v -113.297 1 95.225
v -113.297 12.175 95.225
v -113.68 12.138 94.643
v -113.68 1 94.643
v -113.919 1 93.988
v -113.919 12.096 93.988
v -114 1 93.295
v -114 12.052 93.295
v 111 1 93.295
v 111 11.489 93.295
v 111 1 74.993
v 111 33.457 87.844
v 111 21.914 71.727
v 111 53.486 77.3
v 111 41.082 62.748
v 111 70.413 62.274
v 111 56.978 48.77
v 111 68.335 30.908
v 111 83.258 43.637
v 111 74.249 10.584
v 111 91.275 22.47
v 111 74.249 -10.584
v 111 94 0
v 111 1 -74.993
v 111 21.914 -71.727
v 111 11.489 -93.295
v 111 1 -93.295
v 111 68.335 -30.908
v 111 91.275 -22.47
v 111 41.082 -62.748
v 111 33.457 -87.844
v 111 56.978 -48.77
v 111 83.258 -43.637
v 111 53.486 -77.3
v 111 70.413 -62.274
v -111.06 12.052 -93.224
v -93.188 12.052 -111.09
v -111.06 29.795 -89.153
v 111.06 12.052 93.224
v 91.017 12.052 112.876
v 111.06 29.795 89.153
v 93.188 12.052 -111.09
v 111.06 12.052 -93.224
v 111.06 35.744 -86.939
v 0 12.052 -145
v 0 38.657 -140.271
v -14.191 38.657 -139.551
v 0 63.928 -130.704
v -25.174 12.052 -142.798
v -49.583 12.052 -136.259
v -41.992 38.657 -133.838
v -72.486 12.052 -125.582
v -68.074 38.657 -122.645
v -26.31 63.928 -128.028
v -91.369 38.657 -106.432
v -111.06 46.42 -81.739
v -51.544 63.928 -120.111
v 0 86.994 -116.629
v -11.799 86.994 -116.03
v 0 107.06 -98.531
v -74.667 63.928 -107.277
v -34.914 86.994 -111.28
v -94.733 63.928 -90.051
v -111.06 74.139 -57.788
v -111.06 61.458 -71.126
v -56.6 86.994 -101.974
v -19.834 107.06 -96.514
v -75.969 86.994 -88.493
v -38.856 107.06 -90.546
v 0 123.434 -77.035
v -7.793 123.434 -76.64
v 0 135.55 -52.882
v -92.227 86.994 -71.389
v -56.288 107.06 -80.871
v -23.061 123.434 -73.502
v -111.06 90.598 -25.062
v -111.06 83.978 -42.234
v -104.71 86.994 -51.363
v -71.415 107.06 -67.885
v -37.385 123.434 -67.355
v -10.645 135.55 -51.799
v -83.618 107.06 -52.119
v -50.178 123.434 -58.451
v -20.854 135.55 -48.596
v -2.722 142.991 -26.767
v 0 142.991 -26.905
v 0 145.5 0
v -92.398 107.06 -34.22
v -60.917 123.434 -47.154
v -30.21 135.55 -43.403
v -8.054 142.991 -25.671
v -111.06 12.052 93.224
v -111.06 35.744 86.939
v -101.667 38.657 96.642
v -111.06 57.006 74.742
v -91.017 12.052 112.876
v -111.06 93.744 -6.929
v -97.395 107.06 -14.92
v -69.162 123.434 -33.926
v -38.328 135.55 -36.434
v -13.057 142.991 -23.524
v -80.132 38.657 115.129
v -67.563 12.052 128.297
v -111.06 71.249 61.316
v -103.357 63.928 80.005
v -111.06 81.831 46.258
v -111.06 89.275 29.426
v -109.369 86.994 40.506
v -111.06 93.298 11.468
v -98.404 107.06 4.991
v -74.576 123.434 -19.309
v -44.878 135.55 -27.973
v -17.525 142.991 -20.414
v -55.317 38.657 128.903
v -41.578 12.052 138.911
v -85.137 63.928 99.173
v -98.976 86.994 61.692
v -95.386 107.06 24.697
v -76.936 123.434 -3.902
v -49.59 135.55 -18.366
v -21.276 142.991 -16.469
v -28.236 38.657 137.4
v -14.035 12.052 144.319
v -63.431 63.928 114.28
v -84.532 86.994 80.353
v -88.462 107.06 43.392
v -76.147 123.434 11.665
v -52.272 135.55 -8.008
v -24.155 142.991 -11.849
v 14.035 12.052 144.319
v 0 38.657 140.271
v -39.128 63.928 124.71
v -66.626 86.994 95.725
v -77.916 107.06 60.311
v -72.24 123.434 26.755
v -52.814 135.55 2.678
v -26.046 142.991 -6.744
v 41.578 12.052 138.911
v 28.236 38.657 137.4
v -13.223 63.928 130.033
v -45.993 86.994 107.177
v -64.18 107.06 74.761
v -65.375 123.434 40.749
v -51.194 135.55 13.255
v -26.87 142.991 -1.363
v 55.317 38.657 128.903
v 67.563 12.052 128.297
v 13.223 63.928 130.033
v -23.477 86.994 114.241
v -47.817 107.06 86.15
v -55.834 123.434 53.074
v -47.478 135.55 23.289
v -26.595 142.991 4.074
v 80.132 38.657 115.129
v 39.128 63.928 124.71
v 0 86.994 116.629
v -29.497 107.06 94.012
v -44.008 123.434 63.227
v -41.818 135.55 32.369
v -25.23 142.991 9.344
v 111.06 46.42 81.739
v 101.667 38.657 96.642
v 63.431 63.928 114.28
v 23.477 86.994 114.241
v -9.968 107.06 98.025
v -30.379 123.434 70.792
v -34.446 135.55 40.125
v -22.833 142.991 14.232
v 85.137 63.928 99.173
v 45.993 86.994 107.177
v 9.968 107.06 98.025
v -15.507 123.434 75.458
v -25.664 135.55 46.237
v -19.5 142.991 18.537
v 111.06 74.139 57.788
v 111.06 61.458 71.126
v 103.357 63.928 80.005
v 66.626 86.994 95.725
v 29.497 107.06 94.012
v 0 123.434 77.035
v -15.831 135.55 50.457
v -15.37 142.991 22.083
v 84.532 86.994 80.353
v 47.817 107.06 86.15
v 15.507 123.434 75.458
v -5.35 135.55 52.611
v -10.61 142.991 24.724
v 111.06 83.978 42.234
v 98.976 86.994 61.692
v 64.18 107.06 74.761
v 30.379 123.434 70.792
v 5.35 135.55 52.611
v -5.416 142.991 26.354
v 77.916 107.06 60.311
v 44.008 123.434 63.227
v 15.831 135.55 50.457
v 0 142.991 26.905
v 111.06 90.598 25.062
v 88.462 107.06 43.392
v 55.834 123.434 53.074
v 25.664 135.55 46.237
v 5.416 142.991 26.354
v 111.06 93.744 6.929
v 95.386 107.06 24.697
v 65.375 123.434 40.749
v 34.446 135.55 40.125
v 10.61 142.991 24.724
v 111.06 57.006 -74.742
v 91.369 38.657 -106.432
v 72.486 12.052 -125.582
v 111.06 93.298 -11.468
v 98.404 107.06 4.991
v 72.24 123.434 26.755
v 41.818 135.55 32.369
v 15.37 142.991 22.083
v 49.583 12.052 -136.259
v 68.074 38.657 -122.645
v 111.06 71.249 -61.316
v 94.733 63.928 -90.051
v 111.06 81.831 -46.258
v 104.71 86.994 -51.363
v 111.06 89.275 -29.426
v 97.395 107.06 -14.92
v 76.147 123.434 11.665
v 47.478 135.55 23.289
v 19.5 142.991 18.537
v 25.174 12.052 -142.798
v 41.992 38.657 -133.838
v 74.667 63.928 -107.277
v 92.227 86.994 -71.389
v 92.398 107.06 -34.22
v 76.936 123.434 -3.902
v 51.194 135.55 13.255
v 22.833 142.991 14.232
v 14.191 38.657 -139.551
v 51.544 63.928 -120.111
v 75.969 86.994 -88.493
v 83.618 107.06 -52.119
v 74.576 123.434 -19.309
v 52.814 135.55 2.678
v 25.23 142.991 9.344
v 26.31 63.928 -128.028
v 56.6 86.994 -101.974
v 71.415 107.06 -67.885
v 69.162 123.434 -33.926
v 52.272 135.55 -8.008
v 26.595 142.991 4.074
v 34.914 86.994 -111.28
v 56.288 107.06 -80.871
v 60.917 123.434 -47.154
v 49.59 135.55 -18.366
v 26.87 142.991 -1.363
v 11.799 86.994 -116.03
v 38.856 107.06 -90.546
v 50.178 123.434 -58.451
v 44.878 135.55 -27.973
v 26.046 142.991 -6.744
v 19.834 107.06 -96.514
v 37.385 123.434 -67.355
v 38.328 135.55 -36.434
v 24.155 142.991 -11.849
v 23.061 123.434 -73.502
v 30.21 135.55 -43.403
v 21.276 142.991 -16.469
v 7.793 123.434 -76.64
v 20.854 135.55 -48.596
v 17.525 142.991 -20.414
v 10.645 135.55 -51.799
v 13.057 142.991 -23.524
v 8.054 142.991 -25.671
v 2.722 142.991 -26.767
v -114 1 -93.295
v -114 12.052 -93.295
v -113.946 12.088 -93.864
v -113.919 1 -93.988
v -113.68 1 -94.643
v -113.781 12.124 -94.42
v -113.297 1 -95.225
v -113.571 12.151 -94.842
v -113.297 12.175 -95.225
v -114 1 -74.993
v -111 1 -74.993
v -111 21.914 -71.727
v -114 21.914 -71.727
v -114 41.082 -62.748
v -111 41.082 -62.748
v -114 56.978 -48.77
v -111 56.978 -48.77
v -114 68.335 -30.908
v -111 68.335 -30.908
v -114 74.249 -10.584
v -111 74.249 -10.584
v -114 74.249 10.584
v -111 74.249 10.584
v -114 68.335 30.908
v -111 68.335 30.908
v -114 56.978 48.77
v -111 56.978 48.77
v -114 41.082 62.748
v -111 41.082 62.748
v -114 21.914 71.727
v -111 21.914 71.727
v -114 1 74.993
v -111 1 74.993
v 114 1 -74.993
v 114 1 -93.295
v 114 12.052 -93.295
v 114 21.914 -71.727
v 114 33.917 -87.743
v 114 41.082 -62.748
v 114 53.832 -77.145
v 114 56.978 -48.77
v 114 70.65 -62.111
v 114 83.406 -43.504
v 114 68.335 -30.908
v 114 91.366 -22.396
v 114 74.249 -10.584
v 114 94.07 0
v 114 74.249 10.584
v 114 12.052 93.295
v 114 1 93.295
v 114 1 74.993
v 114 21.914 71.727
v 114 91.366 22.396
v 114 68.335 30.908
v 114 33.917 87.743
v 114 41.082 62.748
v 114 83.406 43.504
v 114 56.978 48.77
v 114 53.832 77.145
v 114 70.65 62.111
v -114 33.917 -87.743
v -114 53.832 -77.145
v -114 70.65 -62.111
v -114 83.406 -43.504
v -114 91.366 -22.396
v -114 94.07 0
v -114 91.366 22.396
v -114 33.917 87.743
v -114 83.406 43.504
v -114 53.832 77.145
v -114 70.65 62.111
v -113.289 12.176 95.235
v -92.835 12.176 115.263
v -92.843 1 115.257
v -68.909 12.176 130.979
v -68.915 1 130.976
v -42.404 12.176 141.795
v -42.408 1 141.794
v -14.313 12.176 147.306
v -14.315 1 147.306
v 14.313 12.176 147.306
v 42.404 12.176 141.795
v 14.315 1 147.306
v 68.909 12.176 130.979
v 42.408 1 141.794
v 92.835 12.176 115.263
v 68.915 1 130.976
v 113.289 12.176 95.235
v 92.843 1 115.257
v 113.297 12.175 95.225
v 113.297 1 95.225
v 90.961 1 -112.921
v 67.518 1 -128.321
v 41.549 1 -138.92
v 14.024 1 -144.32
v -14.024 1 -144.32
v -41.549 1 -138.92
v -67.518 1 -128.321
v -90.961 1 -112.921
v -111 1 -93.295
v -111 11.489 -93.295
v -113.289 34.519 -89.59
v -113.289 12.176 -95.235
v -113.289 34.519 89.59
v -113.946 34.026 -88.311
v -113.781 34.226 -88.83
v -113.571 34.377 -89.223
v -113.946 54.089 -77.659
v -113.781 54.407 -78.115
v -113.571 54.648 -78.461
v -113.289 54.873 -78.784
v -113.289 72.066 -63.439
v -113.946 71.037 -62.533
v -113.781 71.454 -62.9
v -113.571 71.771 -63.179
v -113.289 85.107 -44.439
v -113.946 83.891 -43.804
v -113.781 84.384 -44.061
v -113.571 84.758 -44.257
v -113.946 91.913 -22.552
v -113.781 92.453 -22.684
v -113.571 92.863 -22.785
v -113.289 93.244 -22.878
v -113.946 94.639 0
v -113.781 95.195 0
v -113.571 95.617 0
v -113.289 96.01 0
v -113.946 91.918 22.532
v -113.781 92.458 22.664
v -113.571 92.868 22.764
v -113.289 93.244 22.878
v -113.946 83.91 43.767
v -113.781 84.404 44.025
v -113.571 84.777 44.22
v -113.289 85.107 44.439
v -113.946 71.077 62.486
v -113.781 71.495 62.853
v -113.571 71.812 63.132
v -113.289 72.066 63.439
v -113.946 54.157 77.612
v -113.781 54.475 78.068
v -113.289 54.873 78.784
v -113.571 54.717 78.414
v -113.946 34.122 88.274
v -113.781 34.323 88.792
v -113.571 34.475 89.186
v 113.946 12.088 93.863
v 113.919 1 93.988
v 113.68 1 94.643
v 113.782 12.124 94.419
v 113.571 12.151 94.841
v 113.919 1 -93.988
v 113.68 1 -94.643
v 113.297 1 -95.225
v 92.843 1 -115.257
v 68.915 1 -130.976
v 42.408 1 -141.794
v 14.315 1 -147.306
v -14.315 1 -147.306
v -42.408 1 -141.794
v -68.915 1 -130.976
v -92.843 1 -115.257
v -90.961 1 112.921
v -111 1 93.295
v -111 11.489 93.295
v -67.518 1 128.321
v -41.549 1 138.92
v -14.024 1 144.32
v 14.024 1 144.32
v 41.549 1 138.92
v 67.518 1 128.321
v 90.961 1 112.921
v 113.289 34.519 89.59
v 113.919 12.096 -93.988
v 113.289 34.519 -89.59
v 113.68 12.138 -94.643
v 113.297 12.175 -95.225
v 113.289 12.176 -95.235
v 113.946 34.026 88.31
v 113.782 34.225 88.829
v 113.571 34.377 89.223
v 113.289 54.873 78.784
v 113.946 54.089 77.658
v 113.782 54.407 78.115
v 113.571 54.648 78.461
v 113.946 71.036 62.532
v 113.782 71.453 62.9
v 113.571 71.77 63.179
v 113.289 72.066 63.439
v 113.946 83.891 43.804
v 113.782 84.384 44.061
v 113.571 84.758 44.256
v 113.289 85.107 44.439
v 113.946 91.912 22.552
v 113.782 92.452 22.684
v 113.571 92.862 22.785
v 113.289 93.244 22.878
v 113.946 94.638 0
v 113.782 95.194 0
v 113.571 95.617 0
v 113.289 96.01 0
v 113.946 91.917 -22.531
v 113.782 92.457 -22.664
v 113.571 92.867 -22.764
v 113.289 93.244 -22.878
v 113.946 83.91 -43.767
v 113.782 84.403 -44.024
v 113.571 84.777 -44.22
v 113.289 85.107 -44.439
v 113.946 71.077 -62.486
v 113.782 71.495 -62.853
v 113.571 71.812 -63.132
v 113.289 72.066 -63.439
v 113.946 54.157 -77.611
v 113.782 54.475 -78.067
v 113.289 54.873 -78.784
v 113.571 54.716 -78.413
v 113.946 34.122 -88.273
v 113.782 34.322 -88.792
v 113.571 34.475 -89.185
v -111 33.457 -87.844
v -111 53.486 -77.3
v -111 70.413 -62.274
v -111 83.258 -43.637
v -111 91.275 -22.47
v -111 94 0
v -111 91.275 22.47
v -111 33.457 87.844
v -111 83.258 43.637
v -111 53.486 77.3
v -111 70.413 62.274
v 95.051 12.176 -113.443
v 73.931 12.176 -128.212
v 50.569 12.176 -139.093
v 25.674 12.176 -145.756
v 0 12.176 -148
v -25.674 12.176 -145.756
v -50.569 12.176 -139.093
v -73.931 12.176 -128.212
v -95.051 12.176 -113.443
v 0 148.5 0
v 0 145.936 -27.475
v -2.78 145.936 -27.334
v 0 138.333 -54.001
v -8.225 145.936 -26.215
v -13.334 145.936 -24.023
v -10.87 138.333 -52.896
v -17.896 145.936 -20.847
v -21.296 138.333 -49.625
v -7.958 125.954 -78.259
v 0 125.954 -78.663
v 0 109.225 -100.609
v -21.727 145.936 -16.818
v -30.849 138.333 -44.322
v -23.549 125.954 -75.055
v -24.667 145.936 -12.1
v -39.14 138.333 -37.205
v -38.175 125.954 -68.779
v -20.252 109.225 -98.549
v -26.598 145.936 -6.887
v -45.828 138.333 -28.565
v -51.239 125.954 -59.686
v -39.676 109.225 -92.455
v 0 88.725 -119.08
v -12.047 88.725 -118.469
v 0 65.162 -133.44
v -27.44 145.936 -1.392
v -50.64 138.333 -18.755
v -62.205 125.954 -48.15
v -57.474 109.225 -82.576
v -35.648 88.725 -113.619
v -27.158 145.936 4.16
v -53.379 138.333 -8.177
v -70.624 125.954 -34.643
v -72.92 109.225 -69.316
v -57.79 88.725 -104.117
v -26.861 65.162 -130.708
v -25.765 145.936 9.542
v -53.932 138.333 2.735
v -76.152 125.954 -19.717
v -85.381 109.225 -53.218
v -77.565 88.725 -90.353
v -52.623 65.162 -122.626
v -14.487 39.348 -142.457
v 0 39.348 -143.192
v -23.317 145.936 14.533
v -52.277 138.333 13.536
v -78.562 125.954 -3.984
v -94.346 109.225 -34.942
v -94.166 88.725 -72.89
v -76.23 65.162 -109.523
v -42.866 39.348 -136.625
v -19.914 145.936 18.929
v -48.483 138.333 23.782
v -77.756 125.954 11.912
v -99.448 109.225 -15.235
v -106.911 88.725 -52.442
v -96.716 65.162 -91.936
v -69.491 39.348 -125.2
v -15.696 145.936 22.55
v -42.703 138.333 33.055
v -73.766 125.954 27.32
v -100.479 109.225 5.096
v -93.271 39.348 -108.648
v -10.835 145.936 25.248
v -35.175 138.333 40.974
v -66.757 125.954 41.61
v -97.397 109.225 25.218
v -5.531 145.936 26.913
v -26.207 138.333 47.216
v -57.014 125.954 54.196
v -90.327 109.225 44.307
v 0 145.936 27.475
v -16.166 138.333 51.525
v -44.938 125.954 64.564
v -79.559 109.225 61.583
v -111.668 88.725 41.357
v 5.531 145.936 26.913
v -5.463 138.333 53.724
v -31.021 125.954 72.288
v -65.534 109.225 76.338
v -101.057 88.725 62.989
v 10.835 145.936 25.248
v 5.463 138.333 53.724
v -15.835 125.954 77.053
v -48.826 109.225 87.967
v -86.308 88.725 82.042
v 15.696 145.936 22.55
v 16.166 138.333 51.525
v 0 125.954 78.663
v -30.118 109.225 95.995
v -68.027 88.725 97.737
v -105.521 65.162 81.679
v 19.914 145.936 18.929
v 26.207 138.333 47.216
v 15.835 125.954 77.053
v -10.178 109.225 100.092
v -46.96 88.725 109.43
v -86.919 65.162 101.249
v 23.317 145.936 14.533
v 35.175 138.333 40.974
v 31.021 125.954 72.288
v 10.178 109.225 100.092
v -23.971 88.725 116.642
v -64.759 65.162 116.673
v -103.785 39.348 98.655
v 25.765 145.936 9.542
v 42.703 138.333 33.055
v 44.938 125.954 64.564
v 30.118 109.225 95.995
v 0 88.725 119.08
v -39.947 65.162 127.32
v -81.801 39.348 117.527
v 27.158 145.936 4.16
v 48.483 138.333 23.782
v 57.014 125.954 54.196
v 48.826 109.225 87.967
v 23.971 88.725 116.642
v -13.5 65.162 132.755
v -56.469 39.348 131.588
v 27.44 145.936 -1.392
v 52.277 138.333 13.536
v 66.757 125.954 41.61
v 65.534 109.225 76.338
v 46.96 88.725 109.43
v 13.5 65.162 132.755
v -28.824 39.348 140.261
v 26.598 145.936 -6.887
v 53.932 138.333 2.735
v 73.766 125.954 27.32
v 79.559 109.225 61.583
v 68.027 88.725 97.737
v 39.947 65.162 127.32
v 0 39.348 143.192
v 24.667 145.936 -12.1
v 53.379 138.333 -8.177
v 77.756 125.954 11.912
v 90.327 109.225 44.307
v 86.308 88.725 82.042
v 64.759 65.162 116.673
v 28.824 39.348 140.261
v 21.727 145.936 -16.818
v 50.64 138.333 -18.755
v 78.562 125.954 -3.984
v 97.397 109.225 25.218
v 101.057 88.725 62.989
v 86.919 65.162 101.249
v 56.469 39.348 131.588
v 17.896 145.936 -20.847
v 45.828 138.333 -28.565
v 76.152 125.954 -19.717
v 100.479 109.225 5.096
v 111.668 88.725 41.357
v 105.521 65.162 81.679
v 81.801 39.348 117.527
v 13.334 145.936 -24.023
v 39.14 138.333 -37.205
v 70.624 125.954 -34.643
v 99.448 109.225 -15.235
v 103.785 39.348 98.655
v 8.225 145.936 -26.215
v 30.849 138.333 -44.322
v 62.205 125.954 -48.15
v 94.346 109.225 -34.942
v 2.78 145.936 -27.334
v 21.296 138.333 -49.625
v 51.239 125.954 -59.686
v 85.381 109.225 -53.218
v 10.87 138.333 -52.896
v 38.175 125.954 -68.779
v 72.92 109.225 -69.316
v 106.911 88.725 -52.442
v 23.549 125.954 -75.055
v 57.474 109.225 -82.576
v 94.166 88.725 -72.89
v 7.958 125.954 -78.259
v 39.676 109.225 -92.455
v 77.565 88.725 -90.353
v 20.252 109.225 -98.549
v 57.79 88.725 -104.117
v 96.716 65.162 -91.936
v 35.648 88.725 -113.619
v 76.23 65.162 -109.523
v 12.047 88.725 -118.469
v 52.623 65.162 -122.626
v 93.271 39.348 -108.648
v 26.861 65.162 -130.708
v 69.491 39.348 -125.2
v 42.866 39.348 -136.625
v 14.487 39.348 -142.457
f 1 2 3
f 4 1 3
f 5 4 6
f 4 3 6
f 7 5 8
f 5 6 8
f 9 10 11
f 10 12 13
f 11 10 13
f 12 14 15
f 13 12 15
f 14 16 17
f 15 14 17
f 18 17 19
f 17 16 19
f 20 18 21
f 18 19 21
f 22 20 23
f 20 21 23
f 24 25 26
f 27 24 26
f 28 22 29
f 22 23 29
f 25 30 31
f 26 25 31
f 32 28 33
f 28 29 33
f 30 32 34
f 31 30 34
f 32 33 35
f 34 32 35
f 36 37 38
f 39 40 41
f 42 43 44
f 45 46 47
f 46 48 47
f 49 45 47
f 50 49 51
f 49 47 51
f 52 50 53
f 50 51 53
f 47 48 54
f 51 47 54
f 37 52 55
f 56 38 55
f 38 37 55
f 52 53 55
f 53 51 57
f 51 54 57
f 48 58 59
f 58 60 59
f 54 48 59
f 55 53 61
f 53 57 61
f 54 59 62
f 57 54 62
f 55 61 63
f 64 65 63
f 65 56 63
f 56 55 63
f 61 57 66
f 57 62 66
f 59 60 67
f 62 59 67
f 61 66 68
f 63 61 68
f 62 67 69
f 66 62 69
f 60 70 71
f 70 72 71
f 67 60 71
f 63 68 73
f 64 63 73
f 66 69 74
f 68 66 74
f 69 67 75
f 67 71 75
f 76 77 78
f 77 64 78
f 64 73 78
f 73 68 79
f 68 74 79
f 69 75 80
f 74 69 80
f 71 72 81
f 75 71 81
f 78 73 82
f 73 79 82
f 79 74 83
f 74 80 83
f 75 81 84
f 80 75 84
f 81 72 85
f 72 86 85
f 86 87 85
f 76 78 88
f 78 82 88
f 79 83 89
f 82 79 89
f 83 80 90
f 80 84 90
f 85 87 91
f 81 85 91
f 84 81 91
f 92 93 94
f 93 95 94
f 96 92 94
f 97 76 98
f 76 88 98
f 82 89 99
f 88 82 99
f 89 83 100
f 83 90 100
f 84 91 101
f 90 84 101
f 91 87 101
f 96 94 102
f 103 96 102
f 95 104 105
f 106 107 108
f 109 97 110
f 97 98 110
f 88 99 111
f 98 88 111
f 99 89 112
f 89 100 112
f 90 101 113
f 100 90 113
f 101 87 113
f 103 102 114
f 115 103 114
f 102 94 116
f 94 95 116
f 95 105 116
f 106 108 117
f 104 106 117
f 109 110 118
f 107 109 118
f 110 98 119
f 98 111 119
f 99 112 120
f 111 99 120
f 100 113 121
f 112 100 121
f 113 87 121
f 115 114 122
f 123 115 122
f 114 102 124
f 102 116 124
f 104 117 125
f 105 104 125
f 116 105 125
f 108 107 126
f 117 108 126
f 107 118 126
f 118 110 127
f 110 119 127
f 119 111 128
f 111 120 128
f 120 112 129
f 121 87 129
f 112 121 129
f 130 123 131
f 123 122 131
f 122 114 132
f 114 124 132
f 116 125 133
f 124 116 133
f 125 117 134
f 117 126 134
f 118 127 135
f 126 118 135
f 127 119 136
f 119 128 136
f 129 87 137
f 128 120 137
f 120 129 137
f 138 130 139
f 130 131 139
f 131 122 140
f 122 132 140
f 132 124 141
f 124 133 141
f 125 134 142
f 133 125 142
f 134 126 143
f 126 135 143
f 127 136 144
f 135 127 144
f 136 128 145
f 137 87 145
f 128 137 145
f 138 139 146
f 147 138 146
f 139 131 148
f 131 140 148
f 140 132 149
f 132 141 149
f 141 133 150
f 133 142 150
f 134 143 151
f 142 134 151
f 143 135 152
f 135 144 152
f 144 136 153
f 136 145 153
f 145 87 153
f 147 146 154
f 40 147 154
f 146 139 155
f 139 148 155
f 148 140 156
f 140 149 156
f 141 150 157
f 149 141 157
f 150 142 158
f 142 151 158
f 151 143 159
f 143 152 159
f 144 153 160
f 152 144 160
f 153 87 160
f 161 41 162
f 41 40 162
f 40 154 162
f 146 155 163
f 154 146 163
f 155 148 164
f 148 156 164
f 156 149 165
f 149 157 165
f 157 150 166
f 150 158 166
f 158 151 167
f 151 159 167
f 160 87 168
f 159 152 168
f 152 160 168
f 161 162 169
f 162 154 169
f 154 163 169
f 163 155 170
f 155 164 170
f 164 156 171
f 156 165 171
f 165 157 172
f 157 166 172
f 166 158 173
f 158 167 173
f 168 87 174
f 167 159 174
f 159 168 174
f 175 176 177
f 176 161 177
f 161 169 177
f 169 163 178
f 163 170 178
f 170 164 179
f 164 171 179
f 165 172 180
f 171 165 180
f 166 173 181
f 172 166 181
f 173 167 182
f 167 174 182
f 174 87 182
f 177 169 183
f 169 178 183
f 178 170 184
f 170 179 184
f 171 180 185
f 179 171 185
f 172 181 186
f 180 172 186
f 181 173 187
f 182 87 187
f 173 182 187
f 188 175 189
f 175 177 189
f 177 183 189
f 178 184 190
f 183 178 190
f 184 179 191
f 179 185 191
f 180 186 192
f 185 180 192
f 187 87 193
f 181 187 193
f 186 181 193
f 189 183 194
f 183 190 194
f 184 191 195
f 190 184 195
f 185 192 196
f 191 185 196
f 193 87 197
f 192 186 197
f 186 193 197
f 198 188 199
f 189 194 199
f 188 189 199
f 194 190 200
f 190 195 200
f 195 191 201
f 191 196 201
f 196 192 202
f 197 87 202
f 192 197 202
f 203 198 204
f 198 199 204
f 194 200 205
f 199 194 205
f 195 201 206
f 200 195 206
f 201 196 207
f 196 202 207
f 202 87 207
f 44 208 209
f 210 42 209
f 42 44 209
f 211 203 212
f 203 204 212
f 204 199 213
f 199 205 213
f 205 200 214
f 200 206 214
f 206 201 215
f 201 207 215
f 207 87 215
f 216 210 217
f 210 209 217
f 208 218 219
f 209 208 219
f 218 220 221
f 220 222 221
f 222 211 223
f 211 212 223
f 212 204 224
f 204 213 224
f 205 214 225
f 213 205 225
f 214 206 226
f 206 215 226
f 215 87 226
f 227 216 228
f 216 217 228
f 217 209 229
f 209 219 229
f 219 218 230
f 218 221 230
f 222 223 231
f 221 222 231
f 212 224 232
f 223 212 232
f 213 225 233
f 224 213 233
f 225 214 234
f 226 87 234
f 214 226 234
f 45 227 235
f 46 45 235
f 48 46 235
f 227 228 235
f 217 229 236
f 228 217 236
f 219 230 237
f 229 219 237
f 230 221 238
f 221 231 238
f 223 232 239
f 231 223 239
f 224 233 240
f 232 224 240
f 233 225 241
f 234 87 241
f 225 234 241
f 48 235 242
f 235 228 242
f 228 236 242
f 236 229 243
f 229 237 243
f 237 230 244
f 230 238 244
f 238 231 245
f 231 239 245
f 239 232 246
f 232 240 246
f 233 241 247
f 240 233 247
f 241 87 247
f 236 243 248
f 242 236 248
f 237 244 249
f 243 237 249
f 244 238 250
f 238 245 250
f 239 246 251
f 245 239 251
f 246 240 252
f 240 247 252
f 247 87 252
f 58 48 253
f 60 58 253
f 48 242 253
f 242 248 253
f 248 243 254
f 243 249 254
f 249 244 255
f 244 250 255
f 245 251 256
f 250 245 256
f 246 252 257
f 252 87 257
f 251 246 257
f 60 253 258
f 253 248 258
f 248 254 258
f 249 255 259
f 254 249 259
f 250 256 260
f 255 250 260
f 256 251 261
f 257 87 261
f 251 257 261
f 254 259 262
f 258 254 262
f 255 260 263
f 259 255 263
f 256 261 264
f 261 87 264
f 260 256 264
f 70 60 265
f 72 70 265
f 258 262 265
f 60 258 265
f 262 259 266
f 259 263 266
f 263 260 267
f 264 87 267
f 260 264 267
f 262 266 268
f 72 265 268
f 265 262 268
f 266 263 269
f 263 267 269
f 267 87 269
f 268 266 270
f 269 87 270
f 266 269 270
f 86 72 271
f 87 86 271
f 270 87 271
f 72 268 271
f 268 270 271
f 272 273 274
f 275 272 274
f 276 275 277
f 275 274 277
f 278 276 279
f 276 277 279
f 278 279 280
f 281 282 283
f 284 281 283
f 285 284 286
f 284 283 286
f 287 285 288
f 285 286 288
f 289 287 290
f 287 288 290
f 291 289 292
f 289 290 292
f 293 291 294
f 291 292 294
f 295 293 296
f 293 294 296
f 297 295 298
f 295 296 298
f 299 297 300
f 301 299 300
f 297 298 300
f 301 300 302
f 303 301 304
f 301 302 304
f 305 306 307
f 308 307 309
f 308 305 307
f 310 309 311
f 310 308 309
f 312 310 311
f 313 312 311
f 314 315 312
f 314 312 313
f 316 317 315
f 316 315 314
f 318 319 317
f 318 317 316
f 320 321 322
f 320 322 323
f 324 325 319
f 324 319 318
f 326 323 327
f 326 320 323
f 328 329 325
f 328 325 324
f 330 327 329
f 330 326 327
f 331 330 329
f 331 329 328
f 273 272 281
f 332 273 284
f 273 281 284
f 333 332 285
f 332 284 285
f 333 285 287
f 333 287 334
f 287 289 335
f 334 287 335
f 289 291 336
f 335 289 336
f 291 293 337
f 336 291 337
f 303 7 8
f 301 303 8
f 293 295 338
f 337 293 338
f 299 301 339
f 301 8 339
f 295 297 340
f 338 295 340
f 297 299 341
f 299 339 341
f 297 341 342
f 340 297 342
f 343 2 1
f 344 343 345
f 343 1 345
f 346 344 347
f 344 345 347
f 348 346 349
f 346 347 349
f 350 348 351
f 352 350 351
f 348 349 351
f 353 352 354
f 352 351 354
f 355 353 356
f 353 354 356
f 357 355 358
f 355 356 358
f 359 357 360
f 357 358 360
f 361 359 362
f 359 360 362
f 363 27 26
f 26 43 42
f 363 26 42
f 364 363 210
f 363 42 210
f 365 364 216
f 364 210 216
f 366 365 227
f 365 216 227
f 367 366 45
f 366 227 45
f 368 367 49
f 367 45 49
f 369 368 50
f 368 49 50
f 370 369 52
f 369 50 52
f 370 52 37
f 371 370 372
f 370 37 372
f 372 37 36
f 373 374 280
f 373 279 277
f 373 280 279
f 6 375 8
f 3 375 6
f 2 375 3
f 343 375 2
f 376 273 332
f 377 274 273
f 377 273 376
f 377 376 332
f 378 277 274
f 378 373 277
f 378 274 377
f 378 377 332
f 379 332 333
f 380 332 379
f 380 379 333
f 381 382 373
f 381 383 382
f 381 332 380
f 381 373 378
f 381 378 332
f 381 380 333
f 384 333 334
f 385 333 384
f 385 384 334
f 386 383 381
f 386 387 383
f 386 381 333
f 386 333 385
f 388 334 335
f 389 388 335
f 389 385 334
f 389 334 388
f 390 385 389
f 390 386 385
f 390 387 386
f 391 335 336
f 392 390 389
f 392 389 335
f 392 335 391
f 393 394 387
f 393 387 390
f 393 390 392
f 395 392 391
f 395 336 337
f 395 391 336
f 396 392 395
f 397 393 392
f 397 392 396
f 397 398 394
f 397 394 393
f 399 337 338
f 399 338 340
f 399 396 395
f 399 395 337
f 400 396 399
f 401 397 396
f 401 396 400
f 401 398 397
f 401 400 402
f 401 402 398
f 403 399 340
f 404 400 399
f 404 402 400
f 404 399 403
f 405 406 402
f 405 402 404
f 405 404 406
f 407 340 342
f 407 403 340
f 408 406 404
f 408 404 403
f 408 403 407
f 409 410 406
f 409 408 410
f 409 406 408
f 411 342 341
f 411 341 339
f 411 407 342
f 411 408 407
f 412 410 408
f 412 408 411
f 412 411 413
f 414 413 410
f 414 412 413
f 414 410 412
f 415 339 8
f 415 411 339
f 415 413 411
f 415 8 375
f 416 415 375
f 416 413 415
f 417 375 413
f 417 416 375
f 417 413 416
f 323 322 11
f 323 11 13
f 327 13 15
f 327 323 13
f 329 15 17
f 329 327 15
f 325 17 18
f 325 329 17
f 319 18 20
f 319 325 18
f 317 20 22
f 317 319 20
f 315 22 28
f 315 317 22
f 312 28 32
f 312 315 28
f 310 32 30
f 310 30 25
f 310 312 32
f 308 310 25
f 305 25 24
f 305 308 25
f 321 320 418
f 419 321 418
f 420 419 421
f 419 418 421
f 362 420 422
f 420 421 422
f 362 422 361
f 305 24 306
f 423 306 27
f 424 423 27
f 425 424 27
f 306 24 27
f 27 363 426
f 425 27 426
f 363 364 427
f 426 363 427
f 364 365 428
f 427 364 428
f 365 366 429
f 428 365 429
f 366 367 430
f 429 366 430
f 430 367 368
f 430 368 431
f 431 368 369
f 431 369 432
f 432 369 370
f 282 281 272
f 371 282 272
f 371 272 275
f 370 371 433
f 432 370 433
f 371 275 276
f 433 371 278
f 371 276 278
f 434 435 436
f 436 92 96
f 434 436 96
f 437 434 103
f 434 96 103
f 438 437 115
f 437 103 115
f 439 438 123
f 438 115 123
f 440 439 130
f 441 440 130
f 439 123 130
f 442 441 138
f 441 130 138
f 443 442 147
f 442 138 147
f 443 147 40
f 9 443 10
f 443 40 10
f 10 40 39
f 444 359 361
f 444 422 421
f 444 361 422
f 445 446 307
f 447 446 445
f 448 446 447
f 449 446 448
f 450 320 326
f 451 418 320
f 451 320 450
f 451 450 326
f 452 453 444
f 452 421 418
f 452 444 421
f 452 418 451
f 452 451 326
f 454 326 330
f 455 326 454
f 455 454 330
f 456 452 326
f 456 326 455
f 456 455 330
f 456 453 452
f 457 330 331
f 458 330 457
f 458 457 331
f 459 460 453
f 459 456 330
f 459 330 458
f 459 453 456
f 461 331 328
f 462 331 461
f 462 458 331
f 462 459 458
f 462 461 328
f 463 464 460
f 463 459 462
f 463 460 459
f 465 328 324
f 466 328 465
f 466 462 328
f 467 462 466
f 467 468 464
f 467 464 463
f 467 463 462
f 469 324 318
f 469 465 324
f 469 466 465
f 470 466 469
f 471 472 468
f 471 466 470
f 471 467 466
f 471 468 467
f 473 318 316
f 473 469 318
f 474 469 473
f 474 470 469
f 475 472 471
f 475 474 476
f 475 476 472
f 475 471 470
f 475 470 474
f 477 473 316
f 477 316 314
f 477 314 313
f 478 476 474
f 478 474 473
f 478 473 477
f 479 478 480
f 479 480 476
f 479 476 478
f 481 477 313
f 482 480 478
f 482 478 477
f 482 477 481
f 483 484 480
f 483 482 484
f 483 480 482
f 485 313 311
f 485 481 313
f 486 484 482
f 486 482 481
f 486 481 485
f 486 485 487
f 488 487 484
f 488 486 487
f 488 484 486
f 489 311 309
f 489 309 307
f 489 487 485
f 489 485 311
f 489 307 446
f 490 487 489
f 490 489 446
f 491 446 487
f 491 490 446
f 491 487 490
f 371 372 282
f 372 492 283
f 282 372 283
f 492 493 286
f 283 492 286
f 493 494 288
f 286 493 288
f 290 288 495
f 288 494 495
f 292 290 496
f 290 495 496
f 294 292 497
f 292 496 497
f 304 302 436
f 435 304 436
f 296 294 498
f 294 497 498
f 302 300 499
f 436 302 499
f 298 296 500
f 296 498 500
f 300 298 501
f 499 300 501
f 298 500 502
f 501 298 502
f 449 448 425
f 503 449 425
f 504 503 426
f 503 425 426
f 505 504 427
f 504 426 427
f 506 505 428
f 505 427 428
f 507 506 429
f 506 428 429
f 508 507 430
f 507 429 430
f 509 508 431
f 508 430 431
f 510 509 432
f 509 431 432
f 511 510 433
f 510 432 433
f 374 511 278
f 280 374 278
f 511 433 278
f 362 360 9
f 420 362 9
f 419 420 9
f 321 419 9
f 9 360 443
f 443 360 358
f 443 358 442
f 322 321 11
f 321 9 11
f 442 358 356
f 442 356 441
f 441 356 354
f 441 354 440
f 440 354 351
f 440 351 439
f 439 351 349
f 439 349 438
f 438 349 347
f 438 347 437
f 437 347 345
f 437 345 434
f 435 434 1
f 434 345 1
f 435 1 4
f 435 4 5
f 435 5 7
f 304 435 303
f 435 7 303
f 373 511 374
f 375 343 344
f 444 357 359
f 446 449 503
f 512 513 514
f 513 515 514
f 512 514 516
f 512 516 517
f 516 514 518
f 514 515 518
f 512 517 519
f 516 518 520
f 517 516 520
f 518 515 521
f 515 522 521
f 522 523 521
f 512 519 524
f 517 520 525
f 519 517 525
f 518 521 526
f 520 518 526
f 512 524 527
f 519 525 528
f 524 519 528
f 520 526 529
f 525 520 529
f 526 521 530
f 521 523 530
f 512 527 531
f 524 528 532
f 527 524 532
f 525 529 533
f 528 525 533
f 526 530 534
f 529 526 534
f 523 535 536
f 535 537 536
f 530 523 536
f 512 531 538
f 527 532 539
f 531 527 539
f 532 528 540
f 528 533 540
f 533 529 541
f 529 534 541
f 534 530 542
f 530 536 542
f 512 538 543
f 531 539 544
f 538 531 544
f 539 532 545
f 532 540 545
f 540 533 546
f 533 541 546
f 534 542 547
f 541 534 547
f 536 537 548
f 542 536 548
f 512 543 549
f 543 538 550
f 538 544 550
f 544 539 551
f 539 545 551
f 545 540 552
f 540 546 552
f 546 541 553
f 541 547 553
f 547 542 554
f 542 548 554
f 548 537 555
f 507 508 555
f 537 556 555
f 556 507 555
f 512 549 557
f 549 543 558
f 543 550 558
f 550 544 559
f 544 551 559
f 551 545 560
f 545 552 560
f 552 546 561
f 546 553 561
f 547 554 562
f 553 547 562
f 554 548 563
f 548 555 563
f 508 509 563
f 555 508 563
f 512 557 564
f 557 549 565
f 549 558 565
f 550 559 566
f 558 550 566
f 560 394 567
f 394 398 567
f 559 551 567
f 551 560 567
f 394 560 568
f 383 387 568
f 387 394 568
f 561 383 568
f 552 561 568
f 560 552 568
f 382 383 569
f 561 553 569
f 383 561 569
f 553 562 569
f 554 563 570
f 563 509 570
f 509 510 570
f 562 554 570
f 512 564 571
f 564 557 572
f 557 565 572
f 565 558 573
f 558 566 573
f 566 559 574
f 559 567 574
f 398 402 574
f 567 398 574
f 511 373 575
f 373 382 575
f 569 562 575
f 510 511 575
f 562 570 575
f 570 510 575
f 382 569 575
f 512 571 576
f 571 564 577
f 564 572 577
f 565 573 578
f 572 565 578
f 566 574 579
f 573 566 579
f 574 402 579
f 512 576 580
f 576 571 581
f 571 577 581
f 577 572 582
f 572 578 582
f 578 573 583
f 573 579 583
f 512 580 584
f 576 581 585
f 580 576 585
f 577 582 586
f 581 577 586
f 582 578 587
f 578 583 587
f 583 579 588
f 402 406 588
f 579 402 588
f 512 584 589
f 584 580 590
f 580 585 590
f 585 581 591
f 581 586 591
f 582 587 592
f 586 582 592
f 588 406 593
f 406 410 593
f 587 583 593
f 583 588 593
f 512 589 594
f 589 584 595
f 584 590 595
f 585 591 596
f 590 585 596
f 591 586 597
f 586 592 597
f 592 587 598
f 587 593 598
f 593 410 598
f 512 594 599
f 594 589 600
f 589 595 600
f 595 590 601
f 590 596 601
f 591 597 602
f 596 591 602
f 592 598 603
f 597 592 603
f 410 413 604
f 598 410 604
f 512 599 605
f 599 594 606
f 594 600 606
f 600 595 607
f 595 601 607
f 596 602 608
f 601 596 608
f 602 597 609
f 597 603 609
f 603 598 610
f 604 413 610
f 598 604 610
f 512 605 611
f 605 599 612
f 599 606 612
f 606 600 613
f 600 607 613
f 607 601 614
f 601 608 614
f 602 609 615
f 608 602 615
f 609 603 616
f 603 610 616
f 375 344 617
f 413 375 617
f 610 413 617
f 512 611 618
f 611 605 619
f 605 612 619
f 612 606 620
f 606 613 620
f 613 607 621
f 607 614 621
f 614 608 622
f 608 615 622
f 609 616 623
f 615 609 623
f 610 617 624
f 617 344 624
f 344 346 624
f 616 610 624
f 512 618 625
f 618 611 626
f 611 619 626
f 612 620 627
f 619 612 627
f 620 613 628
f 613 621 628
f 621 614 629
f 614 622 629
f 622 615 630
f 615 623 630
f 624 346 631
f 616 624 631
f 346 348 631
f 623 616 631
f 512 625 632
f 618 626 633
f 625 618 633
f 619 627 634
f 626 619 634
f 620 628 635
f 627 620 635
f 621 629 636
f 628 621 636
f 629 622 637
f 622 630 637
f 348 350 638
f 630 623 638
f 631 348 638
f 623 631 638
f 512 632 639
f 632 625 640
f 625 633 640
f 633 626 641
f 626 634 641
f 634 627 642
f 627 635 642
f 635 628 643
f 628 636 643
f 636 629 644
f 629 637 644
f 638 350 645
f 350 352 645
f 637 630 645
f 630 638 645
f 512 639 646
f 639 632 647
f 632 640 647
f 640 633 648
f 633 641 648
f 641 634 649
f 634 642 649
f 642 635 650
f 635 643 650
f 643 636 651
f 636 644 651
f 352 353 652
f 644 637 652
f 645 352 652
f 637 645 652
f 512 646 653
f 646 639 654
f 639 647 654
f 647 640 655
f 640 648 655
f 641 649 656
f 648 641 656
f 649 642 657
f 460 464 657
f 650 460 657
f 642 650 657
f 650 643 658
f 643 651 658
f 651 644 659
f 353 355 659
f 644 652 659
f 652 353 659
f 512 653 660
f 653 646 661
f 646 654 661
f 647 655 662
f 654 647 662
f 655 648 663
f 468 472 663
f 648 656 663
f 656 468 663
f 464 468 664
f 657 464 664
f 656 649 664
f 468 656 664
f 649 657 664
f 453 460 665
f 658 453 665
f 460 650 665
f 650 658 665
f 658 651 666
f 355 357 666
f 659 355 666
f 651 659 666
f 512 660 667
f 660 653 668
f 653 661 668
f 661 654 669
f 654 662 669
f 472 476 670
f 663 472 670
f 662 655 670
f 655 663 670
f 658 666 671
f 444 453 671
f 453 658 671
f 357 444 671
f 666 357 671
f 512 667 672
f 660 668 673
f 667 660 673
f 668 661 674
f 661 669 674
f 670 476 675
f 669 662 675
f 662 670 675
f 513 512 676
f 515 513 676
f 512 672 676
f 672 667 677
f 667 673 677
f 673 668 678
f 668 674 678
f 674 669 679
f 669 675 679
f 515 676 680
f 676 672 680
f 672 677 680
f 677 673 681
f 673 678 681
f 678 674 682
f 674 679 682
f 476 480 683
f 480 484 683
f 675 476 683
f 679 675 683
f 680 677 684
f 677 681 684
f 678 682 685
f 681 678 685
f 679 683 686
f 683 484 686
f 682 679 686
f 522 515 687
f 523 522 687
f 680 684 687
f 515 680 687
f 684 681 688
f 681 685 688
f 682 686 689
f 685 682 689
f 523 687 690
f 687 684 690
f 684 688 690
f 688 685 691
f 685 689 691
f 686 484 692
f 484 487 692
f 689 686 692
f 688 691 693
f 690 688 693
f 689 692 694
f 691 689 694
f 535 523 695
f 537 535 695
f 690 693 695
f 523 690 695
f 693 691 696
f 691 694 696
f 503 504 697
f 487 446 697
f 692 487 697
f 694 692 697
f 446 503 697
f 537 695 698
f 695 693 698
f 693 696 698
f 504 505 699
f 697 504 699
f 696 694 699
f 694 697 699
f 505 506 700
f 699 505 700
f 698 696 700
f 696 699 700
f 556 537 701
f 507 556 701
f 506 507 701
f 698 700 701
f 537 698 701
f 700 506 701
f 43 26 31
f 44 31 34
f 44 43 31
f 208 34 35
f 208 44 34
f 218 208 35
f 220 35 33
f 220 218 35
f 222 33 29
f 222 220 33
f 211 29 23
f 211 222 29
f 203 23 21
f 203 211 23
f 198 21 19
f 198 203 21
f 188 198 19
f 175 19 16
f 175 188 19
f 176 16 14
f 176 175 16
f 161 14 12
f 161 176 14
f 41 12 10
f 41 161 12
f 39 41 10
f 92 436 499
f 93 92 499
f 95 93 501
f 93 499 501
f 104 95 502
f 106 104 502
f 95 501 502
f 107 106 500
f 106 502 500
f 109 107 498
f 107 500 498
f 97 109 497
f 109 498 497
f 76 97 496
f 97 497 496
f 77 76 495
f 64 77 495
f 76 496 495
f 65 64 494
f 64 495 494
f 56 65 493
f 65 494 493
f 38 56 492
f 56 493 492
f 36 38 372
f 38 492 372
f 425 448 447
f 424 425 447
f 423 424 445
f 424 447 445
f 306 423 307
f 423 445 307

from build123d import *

# Parameters (mm, degrees)
ESQUISSE2_OUTSIDE_W     = 386.766
ESQUISSE2_OUTSIDE_H     = 238.266
ESQUISSE2_OUTSIDE_W_2   = 228
ESQUISSE2_OUTSIDE_H_2   = 155
ENL_V_MAT_EXTRU_1_DEPTH = 150
BOSS_EXTRU_1_DEPTH      = 3
BOSS_EXTRU_2_START      = -3
BOSS_EXTRU_2_DEPTH      = 3
CONG_1_R                = 3


with BuildPart() as part:
    # Esquisse1 → Révolution4 (revolve)
    with BuildSketch(Plane.XY, mode=Mode.PRIVATE) as r_volution4_sk:
        with BuildLine():
            Line((148, 12.175795662), (148, 1))
            Line((148, 1), (145, 1))
            Line((145, 1), (145, 12.051970793))
            ThreePointArc((145, 12.051970793), (98.530929788, 107.060290842), (0, 145.5))
            Line((0, 145.5), (0, 148.5))
            ThreePointArc((0, 148.5), (100.608509442, 109.225353412), (148, 12.175795662))
        make_face()
    revolve(r_volution4_sk.sketch.rotate(Axis((0, 0, 0), (0, 1, 0)), 90), axis=Axis((0, 0, 0), (0, 1, 0)))

    # Esquisse2 outside → Enlèv. mat.-Extru.1 (cut, symmetric)
    with BuildSketch(Plane.XY):
        with Locations((0, 74.75)):
            Rectangle(ESQUISSE2_OUTSIDE_W, ESQUISSE2_OUTSIDE_H)
        with Locations((0, 72.5)):
            Rectangle(ESQUISSE2_OUTSIDE_W_2, ESQUISSE2_OUTSIDE_H_2, mode=Mode.SUBTRACT)
    extrude(amount=ENL_V_MAT_EXTRU_1_DEPTH, both=True, mode=Mode.SUBTRACT)

    # Esquisse3 → Boss.-Extru.1 (add)
    with BuildSketch(Plane(origin=(114, 0, 0), x_dir=(0, 0, -1), z_dir=(1, 0, 0))):
        with BuildLine():
            Line((-93.994680701, 1), (-74.993333037, 1))
            ThreePointArc((-74.993333037, 1), (0, 75), (74.993333037, 1))
            Line((74.993333037, 1), (93.994680701, 1))
            ThreePointArc((93.994680701, 1), (0, 94), (-93.994680701, 1))
        make_face()
    extrude(amount=-BOSS_EXTRU_1_DEPTH)

    # Esquisse4 → Boss.-Extru.2 (add)
    with BuildSketch(Plane.ZY.offset(114).offset(BOSS_EXTRU_2_START)):
        with BuildLine():
            Line((-93.994680701, 1), (-74.993333037, 1))
            ThreePointArc((-74.993333037, 1), (0, 75), (74.993333037, 1))
            Line((74.993333037, 1), (93.994680701, 1))
            ThreePointArc((93.994680701, 1), (0, 94), (-93.994680701, 1))
        make_face()
    extrude(amount=BOSS_EXTRU_2_DEPTH)

    # Congé1
    # the kernel refuses this fillet: 3 mm, written as the material it takes off along each edge
    with BuildSketch(Plane(origin=(-114, 20.411983352, -94.382201712), x_dir=(0.6405708887604551, 0, -0.767899040546764), z_dir=(0, -1, 0)), Plane(origin=(114, 20.411983352, 94.382201712), x_dir=(-0.6405708887604538, 0, 0.7678990405467649), z_dir=(0, -1, 0))) as cong_1_piece_1:
        with BuildLine():
            CenterArc((1.087028375, 2.999979354), CONG_1_R, 230.165597581, 40.046969931)
            Line((-0.834684291, 0.696282232), (0, 0))
            ThreePointArc((0, 0), (0.549079179, -0.001018544), (1.098158359, 0))
        make_face()
    extrude(amount=22.157379249, mode=Mode.SUBTRACT)
    with BuildSketch(Plane(origin=(-114, 0, 0), x_dir=(0, 0.09906318090270165, -0.9950811455300712), z_dir=(0, -0.9950811455300712, -0.09906318090270165))) as cong_1_piece_2:
        with BuildLine():
            CenterArc((94.070452322, 3), CONG_1_R, 270, 40.28066089)
            ThreePointArc((96.010049277, 0.711340206), (95.587852119, 0.354883399), (95.164331553, 0))
            Line((95.164331553, 0), (94.070452322, 0))
        make_face()
    revolve(axis=Axis((-114, 0, 0), (1, 0, 0)), revolution_arc=168.629546335, mode=Mode.SUBTRACT)
    with BuildSketch(Plane(origin=(-114, 20.411983352, 94.382201712), x_dir=(0, 0, -1), z_dir=(0, -1, 0))) as cong_1_piece_3:
        with BuildLine():
            CenterArc((1.086971394, 3), CONG_1_R, 229.953030069, 40.046969931)
            ThreePointArc((-0.84327475, 0.703448276), (-0.422289825, 0.350941999), (0, 0))
            Line((0, 0), (1.086971394, 0))
        make_face()
    extrude(amount=22.157379249, mode=Mode.SUBTRACT)
    with BuildSketch(Plane(origin=(114, 0, 0), x_dir=(0, 0.09906318090270108, 0.9950811455300712), z_dir=(0, -0.9950811455300712, 0.09906318090270108))) as cong_1_piece_4:
        with BuildLine():
            CenterArc((94.070452322, 3), CONG_1_R, 270, 40.28066089)
            Line((94.070452322, 0), (95.164331553, 0))
            ThreePointArc((95.164331553, 0), (95.587852119, 0.354883399), (96.010049277, 0.711340206))
        make_face()
    revolve(axis=Axis((114, 0, 0), (-1, 0, 0)), revolution_arc=168.629546335, mode=Mode.SUBTRACT)
    with BuildSketch(Plane(origin=(114, 20.411983352, -94.382201712), x_dir=(-0.6405708887604424, 0, -0.7678990405467746), z_dir=(0, -1, 0))) as cong_1_piece_5:
        with BuildLine():
            CenterArc((1.087028375, -2.999979354), CONG_1_R, 89.787432488, 40.046969931)
            Line((-0.834684291, -0.696282232), (0, 0))
            ThreePointArc((0, 0), (0.549079179, 0.001018544), (1.098158359, 0))
        make_face()
    extrude(amount=22.157379249, mode=Mode.SUBTRACT)


solid = part.part
